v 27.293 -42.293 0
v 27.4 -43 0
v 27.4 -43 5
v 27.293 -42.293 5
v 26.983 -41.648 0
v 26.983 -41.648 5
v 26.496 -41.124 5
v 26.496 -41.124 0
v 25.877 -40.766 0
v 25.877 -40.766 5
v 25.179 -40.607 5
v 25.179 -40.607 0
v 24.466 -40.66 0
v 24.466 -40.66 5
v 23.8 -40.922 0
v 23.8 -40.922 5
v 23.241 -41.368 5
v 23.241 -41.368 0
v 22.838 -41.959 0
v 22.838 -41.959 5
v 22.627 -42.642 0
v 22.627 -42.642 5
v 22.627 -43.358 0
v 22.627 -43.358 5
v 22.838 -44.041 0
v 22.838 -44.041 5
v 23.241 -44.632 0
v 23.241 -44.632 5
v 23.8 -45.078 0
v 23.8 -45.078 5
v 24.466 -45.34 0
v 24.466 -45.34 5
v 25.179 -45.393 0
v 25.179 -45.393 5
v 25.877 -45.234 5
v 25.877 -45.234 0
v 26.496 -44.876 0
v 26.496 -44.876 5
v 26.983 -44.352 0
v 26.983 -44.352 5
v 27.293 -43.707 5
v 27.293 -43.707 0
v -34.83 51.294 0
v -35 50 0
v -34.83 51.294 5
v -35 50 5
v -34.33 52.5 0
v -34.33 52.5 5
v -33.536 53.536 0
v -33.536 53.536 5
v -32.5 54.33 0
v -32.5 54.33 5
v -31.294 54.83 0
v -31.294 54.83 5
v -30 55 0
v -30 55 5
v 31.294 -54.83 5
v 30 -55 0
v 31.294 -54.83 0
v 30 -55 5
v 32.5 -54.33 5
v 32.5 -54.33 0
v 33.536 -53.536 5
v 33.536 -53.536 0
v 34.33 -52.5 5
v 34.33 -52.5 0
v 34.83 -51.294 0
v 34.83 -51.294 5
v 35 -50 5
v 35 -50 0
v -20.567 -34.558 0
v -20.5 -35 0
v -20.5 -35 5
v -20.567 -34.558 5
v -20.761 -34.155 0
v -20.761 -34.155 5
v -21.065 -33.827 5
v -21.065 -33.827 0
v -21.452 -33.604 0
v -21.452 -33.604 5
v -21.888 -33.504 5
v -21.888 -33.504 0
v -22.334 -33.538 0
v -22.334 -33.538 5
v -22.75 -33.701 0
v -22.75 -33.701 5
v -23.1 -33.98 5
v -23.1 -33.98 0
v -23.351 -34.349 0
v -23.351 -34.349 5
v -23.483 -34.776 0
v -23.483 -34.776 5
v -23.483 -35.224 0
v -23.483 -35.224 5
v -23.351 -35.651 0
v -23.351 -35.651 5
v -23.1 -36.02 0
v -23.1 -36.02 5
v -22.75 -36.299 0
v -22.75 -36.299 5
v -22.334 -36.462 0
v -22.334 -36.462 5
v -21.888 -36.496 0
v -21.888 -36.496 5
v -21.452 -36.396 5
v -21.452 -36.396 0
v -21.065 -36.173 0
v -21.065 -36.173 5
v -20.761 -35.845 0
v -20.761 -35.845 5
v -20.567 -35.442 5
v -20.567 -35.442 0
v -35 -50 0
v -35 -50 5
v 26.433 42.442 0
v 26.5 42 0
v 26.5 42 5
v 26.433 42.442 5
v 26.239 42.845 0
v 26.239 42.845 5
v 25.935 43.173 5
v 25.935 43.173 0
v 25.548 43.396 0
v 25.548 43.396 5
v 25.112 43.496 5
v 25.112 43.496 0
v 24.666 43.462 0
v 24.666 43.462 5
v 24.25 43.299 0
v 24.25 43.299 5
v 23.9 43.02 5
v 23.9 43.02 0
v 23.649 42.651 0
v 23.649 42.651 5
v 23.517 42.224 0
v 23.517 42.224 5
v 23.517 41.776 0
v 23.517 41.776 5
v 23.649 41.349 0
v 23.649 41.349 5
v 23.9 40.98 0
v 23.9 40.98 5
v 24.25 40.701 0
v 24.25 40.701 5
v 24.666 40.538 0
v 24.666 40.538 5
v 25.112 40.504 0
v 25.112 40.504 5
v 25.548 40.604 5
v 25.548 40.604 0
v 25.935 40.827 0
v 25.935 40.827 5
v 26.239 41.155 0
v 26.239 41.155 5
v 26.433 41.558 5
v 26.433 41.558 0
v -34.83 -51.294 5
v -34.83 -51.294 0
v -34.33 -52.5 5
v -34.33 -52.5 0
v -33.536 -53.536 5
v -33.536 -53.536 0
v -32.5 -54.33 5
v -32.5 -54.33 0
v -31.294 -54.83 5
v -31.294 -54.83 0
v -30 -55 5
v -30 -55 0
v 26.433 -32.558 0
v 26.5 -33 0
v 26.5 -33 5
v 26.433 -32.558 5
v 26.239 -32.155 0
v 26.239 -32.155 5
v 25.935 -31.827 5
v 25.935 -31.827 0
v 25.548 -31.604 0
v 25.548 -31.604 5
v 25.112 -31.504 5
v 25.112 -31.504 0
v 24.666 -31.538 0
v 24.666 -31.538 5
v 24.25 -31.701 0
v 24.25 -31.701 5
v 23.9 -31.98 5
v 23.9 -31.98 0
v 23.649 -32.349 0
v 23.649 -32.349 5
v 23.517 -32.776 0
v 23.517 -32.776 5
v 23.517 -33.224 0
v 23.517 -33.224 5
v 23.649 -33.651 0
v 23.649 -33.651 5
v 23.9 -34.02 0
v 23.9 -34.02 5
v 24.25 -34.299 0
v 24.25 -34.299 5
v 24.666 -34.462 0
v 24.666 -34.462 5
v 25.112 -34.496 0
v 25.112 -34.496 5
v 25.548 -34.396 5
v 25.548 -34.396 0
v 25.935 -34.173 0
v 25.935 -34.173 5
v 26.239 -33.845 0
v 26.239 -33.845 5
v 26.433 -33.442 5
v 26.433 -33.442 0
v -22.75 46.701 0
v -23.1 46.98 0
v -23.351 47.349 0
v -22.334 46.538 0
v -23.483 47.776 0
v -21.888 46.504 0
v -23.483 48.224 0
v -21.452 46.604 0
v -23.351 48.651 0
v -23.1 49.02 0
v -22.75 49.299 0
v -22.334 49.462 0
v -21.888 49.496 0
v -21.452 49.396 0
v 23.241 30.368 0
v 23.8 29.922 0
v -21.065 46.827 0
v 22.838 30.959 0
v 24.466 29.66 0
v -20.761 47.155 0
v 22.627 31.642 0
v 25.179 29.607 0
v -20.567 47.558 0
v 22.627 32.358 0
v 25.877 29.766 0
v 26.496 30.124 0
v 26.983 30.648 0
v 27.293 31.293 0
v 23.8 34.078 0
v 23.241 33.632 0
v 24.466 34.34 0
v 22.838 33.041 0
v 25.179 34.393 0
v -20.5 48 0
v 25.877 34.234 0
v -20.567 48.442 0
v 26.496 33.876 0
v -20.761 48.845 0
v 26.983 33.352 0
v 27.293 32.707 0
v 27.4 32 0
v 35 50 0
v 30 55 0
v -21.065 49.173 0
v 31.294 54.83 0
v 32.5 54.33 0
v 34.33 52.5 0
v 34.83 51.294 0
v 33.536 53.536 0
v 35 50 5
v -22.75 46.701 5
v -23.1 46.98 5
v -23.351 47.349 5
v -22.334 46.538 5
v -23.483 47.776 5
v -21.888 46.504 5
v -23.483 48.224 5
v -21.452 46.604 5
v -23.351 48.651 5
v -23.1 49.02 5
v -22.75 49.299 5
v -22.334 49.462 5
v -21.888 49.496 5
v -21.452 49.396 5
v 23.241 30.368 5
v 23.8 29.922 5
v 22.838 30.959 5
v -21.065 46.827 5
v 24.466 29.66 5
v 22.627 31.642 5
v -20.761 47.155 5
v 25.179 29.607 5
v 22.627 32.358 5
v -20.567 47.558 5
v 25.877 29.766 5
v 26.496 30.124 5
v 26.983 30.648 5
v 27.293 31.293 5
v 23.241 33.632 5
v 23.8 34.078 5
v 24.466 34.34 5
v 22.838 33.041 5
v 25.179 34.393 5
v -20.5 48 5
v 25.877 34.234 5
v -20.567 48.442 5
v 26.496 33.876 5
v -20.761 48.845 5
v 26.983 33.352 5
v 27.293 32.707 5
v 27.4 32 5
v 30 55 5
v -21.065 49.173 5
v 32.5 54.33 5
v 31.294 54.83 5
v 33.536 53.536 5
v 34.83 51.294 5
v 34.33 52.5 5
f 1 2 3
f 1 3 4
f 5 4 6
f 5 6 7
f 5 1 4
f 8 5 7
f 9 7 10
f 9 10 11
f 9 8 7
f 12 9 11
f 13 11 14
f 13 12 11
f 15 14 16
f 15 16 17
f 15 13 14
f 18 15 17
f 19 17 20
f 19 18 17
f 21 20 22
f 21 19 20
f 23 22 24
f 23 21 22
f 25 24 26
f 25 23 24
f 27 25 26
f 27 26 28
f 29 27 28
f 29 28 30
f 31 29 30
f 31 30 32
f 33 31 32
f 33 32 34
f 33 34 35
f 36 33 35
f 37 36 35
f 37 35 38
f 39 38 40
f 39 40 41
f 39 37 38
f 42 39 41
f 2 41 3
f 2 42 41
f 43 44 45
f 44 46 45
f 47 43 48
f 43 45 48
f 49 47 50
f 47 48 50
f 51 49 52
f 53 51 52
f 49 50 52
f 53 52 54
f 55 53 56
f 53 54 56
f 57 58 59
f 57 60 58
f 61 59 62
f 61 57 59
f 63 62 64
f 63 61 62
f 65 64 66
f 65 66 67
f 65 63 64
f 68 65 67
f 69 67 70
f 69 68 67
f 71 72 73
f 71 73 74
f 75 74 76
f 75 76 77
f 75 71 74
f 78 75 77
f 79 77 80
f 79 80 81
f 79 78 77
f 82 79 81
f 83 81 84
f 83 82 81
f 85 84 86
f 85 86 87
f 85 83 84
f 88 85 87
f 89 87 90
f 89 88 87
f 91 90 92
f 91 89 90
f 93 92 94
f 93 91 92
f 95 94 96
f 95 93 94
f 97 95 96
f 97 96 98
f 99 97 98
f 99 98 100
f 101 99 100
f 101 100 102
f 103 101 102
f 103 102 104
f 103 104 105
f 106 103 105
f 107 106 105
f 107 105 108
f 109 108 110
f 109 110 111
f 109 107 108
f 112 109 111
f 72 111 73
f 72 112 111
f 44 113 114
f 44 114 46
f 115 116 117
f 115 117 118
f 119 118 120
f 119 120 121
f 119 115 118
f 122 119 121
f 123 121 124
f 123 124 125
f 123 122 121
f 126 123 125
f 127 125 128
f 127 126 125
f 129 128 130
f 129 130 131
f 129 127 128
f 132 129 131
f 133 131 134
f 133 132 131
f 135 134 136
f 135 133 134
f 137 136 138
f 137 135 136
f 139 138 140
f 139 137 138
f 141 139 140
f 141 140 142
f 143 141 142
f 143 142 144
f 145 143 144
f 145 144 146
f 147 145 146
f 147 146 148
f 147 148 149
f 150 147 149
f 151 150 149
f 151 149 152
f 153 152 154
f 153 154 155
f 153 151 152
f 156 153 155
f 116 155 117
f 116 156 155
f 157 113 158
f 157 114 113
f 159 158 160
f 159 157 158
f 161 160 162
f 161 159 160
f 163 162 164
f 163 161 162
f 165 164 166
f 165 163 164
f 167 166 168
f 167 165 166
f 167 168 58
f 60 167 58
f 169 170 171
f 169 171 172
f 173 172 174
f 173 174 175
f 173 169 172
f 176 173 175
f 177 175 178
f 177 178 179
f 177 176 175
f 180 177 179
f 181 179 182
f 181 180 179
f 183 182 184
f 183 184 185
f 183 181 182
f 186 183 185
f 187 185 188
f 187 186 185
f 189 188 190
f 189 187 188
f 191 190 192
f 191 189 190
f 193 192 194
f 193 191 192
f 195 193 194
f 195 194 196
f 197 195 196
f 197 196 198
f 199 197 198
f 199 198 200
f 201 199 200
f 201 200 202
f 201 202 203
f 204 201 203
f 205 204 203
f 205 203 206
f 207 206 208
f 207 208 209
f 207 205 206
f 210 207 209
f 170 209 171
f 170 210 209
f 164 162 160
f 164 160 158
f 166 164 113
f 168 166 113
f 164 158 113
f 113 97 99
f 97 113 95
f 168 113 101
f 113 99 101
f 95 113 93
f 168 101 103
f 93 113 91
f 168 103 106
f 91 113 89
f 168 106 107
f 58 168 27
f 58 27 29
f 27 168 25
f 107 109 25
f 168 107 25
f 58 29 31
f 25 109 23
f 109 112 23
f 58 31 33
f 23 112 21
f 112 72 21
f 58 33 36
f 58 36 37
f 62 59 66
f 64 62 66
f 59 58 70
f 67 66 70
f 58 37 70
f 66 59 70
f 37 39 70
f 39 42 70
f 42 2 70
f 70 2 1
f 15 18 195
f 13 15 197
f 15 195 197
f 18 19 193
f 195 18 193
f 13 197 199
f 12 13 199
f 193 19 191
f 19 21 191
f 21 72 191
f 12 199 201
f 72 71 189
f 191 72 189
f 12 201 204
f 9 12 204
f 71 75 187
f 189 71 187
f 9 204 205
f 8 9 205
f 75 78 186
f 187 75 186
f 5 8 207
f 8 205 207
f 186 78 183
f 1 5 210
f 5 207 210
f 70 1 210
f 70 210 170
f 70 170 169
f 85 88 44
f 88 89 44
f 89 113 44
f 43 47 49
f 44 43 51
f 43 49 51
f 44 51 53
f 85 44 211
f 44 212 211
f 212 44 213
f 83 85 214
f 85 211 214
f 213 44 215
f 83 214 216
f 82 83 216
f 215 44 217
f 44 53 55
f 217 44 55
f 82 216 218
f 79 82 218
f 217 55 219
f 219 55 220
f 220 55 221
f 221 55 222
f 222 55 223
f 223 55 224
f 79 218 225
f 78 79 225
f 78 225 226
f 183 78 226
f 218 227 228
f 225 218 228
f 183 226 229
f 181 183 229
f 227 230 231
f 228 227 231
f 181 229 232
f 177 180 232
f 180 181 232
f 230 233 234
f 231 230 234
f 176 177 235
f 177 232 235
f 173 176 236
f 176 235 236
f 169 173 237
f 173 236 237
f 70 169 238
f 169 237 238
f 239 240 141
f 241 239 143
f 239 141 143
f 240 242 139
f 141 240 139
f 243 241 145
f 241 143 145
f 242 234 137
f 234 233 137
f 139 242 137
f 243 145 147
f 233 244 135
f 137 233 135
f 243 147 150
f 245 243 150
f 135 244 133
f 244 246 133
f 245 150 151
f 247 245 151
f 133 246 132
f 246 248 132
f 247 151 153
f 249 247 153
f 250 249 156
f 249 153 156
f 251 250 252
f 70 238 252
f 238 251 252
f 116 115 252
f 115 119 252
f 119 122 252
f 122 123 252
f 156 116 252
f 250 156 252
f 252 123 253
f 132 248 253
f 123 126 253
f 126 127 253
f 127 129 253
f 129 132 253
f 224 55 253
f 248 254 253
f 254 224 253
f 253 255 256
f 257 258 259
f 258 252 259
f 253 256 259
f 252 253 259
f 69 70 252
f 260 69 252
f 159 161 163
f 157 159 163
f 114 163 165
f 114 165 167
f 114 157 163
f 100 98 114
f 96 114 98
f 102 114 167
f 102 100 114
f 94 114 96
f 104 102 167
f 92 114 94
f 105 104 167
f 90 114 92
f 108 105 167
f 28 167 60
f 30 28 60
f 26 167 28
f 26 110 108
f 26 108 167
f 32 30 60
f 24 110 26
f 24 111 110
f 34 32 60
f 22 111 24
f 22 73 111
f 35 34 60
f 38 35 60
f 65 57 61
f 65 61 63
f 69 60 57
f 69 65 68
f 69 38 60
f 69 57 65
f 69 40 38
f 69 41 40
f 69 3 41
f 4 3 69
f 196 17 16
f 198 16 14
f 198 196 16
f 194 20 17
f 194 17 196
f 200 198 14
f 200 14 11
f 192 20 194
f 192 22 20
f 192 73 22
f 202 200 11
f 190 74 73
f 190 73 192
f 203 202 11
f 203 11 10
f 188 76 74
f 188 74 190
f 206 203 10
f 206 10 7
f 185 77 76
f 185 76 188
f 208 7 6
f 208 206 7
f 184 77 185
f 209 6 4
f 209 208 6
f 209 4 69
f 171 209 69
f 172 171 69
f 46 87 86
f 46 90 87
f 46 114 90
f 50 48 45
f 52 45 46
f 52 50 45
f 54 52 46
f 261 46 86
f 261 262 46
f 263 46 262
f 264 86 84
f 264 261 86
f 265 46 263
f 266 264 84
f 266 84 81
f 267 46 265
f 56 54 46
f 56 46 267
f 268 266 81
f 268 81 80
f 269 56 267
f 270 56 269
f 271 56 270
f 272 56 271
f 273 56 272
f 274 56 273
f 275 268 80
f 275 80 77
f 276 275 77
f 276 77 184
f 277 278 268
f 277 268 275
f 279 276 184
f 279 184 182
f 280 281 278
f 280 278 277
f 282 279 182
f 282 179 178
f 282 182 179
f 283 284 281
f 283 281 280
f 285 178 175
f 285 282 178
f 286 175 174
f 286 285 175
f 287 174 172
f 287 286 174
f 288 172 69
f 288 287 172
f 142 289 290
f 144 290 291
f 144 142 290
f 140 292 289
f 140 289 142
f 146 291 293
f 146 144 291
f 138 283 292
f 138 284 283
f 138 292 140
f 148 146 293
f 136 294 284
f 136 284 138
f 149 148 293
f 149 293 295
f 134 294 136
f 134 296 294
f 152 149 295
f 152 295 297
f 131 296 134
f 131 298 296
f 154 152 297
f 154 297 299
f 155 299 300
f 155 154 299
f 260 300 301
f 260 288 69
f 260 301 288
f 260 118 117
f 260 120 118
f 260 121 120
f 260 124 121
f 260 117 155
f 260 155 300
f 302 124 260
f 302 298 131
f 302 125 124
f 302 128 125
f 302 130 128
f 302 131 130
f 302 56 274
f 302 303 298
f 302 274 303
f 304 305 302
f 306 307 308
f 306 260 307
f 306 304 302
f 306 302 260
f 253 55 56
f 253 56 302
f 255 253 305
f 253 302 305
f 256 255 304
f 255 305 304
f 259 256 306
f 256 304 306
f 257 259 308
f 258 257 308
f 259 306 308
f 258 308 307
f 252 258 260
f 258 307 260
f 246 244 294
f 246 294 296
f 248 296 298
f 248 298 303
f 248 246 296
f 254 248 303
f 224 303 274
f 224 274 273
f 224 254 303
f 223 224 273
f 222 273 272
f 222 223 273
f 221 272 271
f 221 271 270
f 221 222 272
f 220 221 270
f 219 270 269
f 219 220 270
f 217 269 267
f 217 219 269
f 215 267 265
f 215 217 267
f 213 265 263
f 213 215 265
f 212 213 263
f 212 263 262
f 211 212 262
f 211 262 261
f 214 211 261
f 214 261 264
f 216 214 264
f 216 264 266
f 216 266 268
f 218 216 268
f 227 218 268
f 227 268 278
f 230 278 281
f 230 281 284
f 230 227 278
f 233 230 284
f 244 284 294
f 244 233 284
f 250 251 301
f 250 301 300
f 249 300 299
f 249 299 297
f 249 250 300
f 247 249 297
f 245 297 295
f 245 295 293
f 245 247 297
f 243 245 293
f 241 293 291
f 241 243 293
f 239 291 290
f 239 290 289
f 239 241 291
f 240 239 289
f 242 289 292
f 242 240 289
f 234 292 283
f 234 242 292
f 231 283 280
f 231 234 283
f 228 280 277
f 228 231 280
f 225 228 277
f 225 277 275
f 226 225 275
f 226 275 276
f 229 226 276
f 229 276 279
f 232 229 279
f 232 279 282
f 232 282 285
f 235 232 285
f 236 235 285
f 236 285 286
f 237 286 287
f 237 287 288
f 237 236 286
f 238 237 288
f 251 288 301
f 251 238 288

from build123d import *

# Parameters (mm, degrees)
SKETCH1_W           = 70
SKETCH1_H           = 110
SKETCH1_R           = 1.5
SKETCH1_R_2         = 2.4
BOSS_EXTRUDE1_DEPTH = 5
FILLET1_R           = 5


with BuildPart() as part:
    # Sketch1 → Boss-Extrude1 (new body)
    with BuildSketch(Plane.XY):
        Rectangle(SKETCH1_W, SKETCH1_H)
        with Locations((25, 42)):
            Circle(SKETCH1_R, mode=Mode.SUBTRACT)
        with Locations((25, -33)):
            Circle(SKETCH1_R, mode=Mode.SUBTRACT)
        with Locations((25, 32)):
            Circle(SKETCH1_R_2, mode=Mode.SUBTRACT)
        with Locations((25, -43)):
            Circle(SKETCH1_R_2, mode=Mode.SUBTRACT)
        with Locations((-22, 48)):
            Circle(SKETCH1_R, mode=Mode.SUBTRACT)
        with Locations((-22, -35)):
            Circle(SKETCH1_R, mode=Mode.SUBTRACT)
    extrude(amount=BOSS_EXTRUDE1_DEPTH)

    # Fillet1
    fillet1_edges = [part.edges().sort_by_distance(p)[0] for p in [
        (35, -55, 2.5),
        (-35, -55, 2.5),
        (-35, 55, 2.5),
        (35, 55, 2.5),
    ]]
    fillet(fillet1_edges, radius=FILLET1_R)


solid = part.part
